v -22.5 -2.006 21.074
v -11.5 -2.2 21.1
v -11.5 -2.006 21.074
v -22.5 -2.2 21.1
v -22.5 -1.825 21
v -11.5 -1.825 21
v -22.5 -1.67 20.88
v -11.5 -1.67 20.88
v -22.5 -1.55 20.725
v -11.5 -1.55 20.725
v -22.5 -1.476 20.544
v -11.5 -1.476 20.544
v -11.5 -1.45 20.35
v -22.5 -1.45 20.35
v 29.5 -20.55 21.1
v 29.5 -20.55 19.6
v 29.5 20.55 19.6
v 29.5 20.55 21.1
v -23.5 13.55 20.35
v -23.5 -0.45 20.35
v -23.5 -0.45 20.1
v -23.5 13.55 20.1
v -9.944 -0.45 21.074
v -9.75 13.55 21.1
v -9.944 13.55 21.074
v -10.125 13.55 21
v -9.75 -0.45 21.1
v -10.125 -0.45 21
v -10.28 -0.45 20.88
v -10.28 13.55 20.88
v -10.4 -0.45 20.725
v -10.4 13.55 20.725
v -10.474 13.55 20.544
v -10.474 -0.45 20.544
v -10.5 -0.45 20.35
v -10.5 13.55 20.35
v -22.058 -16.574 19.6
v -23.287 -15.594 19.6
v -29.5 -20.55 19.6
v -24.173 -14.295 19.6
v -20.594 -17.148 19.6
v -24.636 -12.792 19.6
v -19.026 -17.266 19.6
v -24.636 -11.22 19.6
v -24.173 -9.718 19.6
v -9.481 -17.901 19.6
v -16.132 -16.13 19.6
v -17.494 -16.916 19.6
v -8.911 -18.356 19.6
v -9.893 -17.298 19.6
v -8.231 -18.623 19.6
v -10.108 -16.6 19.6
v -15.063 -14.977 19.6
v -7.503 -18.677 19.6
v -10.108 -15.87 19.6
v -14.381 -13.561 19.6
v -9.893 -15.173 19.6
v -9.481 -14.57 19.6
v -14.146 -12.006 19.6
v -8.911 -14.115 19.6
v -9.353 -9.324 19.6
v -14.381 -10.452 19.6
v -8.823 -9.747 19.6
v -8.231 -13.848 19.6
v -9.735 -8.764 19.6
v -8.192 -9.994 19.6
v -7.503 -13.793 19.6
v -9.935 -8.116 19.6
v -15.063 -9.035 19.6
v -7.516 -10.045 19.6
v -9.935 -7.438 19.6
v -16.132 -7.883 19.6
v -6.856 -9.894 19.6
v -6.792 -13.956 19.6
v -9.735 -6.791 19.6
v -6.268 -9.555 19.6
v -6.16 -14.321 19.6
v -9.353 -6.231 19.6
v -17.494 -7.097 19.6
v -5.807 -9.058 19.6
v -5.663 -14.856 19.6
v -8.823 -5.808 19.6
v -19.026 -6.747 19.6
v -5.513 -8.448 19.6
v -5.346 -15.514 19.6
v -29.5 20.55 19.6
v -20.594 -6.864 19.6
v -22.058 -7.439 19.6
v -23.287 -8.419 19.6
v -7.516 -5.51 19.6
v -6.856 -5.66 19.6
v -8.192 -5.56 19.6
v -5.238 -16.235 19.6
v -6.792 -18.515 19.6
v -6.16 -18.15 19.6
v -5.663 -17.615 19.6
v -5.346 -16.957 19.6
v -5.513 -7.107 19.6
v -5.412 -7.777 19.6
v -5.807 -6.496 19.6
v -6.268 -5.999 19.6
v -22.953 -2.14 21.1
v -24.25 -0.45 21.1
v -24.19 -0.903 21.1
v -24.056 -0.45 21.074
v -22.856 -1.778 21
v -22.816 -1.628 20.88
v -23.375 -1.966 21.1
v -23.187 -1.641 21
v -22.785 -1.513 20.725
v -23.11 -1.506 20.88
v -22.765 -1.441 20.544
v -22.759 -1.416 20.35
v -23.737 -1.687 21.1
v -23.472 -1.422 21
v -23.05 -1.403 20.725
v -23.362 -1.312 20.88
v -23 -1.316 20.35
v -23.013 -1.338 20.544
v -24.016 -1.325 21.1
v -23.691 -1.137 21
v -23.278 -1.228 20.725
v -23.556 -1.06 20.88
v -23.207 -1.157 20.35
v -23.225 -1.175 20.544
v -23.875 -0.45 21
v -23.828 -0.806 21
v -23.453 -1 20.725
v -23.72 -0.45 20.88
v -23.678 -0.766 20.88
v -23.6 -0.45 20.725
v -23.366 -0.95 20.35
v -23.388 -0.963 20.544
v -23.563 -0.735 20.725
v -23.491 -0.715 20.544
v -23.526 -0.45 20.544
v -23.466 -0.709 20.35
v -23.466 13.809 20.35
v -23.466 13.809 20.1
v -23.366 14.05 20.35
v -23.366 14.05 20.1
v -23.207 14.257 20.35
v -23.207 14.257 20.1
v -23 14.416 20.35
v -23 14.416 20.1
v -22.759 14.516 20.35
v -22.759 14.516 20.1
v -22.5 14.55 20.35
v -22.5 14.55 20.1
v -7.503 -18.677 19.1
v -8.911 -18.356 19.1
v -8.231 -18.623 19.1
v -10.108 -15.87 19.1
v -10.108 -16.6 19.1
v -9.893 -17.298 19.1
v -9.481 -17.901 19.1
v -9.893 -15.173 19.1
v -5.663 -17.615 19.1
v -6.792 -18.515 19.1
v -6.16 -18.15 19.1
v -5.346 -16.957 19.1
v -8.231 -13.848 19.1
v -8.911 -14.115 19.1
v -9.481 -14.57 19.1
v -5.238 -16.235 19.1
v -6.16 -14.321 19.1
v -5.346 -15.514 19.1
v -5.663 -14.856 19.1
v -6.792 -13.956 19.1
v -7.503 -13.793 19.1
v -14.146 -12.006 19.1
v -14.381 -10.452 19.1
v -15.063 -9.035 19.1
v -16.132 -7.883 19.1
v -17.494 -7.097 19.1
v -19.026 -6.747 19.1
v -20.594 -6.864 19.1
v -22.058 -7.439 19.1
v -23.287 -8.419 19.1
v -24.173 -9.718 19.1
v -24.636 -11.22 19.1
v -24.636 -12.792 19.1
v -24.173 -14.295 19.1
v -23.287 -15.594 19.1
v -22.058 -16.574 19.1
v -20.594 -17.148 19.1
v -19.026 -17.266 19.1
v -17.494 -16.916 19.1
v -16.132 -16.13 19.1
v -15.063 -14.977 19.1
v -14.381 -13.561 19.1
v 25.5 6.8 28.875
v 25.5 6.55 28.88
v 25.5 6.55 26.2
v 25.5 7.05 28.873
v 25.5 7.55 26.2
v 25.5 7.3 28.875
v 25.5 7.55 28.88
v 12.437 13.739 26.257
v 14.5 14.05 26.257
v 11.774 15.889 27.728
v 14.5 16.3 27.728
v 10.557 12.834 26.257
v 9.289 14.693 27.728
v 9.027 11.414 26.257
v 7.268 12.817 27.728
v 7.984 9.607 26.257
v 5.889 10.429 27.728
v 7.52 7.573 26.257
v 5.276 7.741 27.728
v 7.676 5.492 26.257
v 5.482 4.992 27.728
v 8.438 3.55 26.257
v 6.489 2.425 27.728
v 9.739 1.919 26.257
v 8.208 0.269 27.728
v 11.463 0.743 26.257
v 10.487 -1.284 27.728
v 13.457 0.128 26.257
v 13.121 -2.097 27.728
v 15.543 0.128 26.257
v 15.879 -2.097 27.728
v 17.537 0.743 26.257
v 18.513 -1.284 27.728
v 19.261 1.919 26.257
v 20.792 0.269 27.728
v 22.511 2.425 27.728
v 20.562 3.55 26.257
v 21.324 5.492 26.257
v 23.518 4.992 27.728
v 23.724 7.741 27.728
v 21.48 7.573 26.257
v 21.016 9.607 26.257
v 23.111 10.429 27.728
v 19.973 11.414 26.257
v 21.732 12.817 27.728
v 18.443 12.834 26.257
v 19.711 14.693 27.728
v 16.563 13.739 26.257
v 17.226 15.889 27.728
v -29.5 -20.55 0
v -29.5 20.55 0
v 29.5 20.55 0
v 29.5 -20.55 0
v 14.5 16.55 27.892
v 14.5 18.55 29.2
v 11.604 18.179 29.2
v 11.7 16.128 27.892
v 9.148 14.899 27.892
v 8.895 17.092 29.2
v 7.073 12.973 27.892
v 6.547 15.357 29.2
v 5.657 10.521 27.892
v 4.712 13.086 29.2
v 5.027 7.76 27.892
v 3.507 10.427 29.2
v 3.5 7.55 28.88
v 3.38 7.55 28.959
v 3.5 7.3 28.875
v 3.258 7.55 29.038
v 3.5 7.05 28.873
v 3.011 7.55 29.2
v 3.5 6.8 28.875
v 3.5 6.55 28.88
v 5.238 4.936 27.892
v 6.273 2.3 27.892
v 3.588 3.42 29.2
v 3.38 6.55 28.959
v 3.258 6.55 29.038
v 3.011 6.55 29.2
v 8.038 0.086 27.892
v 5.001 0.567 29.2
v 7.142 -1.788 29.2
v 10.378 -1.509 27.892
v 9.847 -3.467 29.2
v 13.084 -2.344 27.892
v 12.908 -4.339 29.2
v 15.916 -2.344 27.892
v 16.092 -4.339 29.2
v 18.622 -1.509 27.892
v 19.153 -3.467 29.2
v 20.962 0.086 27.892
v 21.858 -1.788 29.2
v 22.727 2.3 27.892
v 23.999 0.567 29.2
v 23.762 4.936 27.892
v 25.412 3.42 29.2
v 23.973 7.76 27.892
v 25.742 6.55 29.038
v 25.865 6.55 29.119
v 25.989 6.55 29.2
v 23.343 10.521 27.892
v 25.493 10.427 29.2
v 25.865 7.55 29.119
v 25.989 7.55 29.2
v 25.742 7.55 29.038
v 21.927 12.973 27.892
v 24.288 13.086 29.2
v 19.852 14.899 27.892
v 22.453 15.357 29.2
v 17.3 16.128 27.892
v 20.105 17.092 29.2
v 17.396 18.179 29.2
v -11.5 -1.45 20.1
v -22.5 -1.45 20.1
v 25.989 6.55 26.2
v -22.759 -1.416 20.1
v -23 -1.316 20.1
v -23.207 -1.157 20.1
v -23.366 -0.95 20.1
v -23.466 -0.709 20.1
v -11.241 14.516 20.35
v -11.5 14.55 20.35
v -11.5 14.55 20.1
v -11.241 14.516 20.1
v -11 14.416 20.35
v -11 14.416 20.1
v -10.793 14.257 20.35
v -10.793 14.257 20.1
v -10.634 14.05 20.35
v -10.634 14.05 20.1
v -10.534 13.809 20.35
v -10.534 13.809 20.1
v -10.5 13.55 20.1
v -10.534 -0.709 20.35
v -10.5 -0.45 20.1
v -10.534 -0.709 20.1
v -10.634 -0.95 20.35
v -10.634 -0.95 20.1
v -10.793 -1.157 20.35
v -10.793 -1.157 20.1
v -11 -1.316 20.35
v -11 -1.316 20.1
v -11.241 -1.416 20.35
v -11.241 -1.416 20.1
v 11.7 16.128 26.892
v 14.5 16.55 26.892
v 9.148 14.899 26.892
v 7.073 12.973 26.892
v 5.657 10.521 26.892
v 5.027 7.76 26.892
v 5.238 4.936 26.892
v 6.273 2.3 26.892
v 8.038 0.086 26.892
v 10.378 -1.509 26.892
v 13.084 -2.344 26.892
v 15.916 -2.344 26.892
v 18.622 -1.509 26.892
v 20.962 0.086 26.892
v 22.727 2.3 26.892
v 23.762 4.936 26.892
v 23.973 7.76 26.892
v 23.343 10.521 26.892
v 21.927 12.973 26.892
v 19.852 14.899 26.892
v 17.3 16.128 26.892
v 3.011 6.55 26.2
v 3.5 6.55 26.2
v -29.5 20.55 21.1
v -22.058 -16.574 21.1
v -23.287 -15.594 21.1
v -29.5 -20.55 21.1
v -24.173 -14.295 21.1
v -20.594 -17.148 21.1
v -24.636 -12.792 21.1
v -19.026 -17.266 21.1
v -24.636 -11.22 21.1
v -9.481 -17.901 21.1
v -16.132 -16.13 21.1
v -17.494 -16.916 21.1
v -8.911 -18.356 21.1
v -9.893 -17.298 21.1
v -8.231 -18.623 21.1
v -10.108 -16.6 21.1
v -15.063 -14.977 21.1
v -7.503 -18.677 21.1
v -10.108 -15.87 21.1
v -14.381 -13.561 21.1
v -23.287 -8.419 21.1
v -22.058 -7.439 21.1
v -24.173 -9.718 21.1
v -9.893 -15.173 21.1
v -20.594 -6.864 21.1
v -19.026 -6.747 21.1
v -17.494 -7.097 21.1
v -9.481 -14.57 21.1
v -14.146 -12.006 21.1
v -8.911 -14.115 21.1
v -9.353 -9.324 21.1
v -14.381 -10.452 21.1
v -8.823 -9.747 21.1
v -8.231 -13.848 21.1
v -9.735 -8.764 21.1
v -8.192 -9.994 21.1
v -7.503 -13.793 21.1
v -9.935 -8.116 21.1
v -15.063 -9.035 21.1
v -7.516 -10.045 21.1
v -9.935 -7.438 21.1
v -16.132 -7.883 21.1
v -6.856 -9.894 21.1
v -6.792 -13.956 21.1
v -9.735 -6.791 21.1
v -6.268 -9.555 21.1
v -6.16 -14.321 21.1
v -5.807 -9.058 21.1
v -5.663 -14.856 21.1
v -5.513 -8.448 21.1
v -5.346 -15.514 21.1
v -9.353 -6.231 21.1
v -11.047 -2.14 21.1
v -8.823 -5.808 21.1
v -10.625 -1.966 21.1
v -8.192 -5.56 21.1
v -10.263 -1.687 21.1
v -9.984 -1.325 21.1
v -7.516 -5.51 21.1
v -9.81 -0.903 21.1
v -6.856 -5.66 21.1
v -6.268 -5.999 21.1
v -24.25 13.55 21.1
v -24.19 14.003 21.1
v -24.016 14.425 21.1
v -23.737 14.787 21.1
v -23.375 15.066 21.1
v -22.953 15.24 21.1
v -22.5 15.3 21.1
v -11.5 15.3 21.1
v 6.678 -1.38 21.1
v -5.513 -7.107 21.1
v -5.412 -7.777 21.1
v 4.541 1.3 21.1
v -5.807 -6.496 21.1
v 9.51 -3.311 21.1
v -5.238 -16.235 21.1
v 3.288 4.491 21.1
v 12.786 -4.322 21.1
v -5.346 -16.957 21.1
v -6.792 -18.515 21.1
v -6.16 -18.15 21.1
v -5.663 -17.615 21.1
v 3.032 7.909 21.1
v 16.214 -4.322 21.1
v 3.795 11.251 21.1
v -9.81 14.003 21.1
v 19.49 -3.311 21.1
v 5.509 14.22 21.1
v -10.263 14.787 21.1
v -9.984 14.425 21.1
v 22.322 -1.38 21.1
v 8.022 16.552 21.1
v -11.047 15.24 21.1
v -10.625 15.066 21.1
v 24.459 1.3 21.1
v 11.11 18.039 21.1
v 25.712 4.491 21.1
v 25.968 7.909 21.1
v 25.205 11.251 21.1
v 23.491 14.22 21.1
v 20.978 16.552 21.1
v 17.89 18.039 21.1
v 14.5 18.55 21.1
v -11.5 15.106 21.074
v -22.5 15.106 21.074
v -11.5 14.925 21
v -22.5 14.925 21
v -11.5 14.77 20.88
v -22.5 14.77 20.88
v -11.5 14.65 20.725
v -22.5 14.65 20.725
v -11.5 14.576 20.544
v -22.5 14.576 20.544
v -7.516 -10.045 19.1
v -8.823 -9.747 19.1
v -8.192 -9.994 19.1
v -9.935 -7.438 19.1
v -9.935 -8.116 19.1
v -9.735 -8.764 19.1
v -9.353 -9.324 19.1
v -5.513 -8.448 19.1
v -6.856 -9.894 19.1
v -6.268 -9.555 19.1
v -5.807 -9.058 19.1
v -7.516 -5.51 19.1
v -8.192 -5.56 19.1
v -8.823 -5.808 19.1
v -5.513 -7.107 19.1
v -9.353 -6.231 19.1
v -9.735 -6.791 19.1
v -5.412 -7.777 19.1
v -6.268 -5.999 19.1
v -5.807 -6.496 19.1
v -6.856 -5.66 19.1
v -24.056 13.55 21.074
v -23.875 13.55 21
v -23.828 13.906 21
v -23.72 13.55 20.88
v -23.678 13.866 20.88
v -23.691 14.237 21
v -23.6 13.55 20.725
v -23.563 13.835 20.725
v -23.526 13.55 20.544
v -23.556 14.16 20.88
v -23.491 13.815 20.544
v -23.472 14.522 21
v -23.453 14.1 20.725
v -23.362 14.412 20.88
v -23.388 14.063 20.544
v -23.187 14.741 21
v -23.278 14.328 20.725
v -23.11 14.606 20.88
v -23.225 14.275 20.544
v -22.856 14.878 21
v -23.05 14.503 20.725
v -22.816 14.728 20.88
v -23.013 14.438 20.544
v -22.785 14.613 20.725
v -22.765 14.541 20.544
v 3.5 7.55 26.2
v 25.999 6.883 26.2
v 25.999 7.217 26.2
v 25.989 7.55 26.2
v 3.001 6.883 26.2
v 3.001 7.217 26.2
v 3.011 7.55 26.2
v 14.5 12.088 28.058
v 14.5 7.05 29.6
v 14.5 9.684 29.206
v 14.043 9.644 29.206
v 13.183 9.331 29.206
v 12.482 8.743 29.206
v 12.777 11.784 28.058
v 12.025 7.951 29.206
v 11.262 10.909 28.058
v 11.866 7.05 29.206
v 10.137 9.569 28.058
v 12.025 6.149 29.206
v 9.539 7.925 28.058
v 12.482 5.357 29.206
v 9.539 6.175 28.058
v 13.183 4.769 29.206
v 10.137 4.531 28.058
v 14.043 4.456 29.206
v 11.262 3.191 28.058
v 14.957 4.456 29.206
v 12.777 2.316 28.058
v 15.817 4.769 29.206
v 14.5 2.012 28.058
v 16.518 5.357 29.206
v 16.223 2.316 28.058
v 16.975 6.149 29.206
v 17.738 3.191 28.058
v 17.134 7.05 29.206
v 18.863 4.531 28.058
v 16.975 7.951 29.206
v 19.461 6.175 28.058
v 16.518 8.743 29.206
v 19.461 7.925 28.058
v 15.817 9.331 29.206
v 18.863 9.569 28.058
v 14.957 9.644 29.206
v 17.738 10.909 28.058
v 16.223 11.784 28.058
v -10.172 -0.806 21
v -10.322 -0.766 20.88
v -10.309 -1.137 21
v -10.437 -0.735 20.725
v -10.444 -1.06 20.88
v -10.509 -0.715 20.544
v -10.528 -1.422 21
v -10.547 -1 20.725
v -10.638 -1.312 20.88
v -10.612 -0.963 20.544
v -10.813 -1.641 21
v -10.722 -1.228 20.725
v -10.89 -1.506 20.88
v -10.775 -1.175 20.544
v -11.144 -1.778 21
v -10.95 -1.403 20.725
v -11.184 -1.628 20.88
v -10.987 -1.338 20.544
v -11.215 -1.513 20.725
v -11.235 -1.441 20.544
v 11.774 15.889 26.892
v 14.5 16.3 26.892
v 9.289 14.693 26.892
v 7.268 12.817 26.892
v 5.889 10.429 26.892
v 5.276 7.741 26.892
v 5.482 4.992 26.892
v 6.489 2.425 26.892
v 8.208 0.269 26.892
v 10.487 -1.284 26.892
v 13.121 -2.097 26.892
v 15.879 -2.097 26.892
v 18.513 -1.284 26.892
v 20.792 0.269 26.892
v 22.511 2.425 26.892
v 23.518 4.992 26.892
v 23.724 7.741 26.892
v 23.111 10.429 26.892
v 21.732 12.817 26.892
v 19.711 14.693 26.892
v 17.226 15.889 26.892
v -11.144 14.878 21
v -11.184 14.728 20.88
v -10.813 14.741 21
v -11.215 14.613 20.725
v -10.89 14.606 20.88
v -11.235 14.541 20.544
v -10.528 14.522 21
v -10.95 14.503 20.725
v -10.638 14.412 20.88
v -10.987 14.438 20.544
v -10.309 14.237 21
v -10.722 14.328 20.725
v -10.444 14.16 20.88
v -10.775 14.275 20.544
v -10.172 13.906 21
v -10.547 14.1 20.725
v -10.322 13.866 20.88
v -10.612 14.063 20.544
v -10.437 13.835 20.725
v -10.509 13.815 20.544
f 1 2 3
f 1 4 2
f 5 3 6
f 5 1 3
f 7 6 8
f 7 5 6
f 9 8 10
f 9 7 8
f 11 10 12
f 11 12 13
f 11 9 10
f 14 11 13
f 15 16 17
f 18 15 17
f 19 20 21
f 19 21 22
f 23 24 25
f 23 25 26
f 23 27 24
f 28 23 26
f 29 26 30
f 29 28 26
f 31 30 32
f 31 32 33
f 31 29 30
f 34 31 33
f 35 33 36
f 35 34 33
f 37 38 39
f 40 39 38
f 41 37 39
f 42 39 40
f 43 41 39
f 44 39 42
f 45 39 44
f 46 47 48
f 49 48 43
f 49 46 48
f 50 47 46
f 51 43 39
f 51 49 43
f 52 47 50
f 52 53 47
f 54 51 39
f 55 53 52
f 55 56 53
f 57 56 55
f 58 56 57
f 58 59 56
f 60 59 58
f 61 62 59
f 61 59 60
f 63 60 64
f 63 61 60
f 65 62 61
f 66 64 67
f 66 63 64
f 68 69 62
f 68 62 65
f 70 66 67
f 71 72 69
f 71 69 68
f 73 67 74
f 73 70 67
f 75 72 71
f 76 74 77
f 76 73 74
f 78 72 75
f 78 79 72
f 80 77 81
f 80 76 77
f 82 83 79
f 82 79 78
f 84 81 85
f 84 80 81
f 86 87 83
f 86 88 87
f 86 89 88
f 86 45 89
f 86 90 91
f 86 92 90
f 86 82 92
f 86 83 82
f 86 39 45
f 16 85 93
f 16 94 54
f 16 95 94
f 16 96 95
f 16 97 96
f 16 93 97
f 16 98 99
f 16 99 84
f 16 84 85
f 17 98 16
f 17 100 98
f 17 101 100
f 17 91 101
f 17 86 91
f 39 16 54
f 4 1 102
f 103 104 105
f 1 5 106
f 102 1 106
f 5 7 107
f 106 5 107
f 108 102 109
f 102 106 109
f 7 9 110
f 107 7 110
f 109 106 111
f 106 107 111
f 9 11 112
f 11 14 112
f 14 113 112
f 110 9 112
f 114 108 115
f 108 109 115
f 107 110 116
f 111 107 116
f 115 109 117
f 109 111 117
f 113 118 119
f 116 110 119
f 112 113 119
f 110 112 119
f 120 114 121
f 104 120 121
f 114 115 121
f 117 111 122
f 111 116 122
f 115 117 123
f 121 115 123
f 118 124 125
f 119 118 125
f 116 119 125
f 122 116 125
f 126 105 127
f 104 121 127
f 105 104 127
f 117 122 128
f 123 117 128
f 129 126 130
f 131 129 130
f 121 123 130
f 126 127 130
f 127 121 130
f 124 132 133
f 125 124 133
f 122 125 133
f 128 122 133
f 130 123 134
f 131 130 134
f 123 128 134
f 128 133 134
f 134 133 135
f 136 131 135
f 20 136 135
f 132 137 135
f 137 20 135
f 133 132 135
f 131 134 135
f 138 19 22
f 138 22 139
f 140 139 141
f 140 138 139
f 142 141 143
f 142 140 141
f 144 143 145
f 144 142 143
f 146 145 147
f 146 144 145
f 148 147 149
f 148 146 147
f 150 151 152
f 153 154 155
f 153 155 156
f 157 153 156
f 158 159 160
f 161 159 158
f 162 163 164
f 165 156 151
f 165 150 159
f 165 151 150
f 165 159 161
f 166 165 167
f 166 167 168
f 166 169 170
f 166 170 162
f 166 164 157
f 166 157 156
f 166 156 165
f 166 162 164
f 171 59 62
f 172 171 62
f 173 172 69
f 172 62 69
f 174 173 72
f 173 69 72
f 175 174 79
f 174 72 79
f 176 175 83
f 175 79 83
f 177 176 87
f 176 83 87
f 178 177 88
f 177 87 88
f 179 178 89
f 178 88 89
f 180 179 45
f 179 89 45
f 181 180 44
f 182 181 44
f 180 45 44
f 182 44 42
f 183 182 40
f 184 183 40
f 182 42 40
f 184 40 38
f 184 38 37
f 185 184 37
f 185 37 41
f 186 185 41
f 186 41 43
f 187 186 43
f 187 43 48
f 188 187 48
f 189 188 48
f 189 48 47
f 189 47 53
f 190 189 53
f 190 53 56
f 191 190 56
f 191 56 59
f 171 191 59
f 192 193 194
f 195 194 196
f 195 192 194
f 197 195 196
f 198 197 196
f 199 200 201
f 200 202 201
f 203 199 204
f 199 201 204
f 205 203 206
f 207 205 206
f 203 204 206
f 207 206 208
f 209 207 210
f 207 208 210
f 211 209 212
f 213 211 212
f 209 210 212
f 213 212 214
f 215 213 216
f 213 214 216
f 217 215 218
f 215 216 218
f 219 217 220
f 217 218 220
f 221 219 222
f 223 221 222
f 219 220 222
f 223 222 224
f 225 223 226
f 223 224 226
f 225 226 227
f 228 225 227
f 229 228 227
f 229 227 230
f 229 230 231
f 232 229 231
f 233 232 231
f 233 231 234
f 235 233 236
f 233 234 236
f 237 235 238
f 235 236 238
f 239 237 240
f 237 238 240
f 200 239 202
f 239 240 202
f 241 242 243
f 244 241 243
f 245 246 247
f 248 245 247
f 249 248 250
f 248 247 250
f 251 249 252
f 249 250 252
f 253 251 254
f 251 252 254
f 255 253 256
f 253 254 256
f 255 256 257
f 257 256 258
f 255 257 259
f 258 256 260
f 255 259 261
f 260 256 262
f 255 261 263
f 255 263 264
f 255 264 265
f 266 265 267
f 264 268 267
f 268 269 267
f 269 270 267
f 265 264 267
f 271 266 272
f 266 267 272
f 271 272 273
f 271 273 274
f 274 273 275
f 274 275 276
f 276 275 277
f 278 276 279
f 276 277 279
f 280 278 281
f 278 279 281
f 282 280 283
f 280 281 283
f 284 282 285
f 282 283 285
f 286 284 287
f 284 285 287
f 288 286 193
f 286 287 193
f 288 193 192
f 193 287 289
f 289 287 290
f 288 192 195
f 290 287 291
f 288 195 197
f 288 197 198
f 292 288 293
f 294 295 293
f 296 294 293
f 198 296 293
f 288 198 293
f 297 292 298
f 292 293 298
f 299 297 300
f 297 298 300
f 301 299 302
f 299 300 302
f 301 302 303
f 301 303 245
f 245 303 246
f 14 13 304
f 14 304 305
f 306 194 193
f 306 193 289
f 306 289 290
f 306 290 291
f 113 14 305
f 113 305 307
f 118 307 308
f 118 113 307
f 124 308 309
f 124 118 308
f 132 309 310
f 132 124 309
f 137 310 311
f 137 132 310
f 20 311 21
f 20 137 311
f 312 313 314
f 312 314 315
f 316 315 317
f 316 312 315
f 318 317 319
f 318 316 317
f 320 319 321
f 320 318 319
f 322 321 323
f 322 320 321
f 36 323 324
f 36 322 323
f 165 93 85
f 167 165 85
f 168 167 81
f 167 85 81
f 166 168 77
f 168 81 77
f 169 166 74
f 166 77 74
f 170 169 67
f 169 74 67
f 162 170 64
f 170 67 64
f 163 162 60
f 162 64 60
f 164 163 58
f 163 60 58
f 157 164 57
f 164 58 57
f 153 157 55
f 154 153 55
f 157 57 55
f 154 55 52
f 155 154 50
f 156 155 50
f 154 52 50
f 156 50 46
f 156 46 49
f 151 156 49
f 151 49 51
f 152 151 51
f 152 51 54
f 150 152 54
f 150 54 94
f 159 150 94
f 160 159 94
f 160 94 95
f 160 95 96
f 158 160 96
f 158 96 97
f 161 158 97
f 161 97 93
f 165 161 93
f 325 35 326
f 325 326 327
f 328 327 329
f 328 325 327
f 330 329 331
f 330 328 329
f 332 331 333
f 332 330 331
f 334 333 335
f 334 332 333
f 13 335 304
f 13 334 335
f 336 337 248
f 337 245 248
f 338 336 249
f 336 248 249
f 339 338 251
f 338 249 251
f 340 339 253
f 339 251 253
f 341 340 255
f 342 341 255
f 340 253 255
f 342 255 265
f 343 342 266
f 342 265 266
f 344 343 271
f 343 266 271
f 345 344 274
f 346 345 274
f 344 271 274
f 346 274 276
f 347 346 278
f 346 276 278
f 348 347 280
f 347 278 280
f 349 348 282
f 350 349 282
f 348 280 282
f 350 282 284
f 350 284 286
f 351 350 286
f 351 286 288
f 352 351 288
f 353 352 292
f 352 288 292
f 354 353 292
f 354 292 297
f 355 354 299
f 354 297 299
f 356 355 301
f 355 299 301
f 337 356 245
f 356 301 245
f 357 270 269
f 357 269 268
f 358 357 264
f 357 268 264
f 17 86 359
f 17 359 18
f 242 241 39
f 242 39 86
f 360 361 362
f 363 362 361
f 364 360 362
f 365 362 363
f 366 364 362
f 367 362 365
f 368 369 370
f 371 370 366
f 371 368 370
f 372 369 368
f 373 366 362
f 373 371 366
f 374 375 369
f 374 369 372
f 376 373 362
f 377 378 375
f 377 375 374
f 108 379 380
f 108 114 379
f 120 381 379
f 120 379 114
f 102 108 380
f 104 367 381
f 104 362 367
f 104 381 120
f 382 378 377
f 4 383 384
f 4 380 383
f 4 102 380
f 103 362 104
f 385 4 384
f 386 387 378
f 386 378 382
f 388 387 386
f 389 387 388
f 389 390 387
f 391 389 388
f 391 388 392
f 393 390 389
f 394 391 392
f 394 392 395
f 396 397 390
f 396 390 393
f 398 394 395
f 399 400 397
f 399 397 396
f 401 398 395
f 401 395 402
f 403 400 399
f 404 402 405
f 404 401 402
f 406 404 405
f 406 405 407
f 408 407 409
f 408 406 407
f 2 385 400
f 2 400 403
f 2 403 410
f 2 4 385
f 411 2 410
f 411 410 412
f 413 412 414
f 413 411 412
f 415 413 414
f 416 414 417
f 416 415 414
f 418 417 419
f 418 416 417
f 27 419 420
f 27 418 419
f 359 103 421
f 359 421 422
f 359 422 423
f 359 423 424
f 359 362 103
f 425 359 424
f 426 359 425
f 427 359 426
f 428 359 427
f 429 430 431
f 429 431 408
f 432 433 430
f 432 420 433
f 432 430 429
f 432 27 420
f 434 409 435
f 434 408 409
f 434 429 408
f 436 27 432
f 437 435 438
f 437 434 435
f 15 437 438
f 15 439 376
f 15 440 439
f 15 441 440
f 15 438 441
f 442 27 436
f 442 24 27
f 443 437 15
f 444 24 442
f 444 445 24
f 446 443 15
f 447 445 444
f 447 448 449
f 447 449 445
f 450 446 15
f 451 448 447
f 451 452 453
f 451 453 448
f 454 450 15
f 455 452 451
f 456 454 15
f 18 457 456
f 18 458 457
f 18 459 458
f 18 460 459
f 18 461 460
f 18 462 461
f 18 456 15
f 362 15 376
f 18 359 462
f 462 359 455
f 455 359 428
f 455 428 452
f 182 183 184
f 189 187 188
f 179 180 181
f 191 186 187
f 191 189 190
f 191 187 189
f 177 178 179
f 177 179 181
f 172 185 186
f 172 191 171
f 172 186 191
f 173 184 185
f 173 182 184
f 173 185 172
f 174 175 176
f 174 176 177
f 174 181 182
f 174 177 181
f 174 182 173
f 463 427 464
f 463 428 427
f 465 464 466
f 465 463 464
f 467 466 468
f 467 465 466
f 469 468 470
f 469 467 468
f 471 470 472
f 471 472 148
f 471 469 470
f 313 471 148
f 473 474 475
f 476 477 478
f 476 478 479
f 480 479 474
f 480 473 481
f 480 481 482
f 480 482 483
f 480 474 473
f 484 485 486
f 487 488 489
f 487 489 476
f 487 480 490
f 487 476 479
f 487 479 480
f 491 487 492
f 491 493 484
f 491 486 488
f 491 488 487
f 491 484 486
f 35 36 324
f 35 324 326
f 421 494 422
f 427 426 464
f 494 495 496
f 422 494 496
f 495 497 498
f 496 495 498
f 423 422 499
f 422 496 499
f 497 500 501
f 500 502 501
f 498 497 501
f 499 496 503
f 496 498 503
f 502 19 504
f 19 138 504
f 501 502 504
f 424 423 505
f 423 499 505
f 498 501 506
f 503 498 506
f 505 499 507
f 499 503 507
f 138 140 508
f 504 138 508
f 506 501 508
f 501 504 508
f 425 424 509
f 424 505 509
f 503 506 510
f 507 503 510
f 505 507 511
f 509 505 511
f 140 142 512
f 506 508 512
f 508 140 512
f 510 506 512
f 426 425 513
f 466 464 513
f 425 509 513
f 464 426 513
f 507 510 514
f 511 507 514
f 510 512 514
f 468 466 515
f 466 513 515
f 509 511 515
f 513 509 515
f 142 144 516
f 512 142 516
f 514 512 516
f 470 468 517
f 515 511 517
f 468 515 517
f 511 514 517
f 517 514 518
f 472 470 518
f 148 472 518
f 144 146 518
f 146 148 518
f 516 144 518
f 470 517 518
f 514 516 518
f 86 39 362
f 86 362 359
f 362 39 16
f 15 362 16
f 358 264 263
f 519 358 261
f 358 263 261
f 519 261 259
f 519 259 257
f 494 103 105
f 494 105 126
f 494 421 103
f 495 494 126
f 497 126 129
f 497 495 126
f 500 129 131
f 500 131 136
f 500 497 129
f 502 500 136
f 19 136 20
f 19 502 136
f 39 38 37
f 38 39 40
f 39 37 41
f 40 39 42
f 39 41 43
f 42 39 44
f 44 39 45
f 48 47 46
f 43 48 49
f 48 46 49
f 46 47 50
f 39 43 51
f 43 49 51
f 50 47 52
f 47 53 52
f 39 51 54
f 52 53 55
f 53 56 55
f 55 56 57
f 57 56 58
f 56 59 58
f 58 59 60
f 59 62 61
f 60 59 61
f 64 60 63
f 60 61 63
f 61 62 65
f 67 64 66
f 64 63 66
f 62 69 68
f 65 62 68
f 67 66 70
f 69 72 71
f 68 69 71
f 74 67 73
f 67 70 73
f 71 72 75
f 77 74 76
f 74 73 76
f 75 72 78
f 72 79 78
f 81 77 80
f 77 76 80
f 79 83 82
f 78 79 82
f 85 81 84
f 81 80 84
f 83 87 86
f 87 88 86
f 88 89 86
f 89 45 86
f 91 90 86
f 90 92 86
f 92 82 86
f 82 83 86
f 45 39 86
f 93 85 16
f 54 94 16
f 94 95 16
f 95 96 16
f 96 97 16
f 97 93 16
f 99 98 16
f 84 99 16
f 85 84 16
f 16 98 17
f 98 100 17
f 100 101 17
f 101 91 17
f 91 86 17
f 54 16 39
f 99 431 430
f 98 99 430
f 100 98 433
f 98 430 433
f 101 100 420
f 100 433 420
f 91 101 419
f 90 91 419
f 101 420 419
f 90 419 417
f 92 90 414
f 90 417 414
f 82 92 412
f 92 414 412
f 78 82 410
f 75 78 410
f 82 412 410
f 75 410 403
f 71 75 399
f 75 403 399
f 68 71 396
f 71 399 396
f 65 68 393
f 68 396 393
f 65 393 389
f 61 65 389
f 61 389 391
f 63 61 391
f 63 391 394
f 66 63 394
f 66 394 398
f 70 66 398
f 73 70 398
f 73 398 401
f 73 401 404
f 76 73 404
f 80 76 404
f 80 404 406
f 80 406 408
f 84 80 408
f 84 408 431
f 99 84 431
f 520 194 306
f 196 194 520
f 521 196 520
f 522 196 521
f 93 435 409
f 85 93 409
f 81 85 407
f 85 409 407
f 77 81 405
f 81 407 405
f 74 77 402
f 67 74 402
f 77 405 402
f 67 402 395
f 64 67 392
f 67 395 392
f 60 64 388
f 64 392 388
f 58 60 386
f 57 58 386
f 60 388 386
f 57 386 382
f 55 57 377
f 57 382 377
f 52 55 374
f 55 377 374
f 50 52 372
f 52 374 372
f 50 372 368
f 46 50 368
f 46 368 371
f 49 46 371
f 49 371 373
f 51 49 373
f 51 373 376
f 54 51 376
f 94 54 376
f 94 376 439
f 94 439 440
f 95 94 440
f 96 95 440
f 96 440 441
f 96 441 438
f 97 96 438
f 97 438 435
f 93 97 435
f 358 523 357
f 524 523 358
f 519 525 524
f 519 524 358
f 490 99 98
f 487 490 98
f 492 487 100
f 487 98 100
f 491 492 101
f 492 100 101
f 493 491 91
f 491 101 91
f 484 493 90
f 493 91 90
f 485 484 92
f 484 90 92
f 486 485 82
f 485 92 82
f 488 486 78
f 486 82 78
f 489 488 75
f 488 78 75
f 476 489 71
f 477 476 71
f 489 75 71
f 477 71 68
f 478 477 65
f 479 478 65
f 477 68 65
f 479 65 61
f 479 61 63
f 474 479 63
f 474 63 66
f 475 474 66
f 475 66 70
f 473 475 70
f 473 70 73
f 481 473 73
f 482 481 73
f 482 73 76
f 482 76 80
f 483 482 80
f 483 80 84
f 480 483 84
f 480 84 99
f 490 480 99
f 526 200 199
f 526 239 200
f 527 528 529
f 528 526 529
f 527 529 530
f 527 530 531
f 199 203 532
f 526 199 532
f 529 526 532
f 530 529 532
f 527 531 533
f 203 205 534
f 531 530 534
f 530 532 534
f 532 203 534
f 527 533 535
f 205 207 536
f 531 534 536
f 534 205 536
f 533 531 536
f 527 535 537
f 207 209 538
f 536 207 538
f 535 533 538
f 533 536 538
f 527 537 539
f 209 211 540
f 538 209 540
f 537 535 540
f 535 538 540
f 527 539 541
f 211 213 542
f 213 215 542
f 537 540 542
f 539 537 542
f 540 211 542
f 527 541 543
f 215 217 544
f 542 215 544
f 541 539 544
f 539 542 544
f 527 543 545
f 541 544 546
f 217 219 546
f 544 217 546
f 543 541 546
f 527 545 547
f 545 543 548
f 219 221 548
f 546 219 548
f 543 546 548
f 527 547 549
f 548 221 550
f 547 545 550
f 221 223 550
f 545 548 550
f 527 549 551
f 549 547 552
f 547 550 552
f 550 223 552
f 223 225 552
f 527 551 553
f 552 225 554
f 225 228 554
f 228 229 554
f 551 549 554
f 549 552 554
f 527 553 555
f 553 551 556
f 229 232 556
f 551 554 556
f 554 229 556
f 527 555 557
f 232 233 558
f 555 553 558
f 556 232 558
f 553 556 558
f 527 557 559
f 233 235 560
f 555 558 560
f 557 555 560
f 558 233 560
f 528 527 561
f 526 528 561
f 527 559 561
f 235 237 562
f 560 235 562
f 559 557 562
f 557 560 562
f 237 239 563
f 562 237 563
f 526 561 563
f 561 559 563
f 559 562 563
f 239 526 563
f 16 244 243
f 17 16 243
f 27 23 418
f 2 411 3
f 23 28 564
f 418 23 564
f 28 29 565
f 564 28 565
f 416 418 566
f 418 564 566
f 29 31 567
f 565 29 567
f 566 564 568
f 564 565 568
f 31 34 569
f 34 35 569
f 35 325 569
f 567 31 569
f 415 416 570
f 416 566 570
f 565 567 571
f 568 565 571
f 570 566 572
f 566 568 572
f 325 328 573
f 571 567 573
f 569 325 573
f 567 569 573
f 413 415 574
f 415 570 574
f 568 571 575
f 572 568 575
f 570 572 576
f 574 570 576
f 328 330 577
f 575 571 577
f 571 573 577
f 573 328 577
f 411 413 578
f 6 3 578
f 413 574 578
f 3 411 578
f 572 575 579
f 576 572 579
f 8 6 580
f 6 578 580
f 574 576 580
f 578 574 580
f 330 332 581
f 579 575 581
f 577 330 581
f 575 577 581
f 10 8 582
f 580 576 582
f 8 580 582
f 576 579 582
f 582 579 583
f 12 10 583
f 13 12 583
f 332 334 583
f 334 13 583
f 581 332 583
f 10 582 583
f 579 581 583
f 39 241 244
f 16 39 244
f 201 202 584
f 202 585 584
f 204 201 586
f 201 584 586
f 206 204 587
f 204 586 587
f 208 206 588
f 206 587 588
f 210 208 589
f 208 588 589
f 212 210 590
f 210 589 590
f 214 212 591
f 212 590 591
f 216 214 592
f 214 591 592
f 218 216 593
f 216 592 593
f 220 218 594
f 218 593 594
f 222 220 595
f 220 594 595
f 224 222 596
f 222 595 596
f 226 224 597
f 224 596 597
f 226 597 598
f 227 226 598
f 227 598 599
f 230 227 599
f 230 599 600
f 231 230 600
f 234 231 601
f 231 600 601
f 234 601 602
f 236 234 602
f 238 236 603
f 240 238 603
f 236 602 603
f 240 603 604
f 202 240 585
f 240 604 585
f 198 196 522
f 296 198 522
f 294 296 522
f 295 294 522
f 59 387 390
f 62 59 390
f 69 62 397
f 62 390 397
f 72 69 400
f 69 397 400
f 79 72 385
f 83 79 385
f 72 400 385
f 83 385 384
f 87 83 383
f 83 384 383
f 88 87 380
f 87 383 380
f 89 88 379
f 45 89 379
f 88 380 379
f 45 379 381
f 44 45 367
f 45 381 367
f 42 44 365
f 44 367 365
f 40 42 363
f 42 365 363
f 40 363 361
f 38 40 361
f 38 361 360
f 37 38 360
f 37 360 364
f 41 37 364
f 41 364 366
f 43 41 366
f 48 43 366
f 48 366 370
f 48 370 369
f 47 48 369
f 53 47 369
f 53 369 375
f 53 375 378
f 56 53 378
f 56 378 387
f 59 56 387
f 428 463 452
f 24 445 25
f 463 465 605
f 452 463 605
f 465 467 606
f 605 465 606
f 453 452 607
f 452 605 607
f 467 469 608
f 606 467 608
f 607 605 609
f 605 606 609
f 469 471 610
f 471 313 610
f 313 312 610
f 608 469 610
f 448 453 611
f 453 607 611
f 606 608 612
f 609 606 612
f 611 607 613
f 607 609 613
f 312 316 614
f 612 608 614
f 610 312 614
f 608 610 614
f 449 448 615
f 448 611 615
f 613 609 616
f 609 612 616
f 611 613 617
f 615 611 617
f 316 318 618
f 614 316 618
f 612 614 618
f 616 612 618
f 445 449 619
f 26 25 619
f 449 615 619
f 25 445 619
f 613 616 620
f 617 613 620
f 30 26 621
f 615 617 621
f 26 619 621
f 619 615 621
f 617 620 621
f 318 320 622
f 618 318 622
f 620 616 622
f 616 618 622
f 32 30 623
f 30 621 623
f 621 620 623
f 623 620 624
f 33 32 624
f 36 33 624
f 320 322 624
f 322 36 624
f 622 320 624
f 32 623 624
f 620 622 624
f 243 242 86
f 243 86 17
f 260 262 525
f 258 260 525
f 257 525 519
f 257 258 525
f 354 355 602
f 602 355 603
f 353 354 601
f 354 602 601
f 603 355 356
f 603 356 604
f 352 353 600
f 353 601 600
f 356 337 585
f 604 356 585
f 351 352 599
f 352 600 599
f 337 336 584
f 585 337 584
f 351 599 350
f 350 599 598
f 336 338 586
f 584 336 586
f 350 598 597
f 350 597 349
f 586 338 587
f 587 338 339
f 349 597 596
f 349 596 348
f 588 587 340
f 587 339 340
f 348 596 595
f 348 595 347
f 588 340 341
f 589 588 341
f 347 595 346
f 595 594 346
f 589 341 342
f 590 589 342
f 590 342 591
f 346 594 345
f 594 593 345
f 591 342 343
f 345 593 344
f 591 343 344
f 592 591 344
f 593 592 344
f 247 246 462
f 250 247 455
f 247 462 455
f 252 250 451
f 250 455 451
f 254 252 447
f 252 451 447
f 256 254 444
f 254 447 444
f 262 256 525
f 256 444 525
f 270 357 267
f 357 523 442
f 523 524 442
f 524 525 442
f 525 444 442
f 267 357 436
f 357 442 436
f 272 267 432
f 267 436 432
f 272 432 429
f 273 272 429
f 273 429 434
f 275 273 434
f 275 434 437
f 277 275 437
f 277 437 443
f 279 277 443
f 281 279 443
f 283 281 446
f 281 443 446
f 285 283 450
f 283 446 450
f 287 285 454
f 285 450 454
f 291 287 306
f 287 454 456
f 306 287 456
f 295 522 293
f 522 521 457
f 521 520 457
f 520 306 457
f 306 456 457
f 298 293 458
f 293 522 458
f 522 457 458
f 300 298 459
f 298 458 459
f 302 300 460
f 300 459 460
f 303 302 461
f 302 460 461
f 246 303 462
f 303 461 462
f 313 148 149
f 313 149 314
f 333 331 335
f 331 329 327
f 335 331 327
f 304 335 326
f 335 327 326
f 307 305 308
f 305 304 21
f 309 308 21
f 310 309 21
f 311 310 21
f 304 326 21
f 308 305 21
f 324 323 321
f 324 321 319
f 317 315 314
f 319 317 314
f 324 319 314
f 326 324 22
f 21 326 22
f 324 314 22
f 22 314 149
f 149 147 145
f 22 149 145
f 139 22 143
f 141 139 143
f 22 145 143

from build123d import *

# Parameters (mm, degrees)
SKETCH1_W              = 59
SKETCH1_H              = 41.1
BOSS_EXTRUDE1_DEPTH    = 19.6
SKETCH2_W              = 59
SKETCH2_H              = 41.1
BOSS_EXTRUDE2_DEPTH    = 1.5
LENS_START             = 8.1
SKETCH5_W              = 0.5
SKETCH5_H              = 1
LENS_SIDE_CUTS_DEPTH   = 3
SCREEN_CUT_DEPTH       = 1
FILLET1_R              = 0.75
SKETCH7_R              = 5.274271813
SKETCH7_R_2            = 2.274069125
SKETCH7_R_3            = 2.44866529
BUTTON_CUTS_FACE_DEPTH = 2


with BuildPart() as part:
    # Sketch1 → Boss-Extrude1 (new body)
    with BuildSketch(Plane.XY):
        Rectangle(SKETCH1_W, SKETCH1_H)
    extrude(amount=BOSS_EXTRUDE1_DEPTH)


with BuildPart() as body_2:
    # Sketch2 → Boss-Extrude2 (new body)
    with BuildSketch(Plane.XY.offset(19.6)):
        Rectangle(SKETCH2_W, SKETCH2_H)
    extrude(amount=BOSS_EXTRUDE2_DEPTH)

    # Sketch4 → lens (revolve)
    with BuildSketch(Plane(origin=(14.5, 0, 0), x_dir=(0, 0, -1), z_dir=(1, 0, 0))):
        with BuildLine():
            Line((-21.1, 7.05), (-29.6, 7.05))
            ThreePointArc((-29.6, 7.05), (-28.721320344, 10.928679656), (-26.256854249, 14.05))
            Line((-26.256854249, 14.05), (-27.728427125, 16.3))
            Line((-27.728427125, 16.3), (-26.891935222, 16.3))
            Line((-26.891935222, 16.3), (-26.891935222, 16.55))
            Line((-26.891935222, 16.55), (-27.891935222, 16.55))
            Line((-27.891935222, 16.55), (-29.2, 18.55))
            Line((-29.2, 18.55), (-21.1, 18.55))
            Line((-21.1, 18.55), (-21.1, 7.05))
        make_face()
    revolve(axis=Axis((14.5, 7.05, 21.1), (0, 0, 1)))

    # Sketch5 → lens side cuts (cut)
    with BuildSketch(Plane.XY.offset(21.1).offset(LENS_START)):
        with Locations((25.75, 7.05)):
            Rectangle(SKETCH5_W, SKETCH5_H)
        with Locations((3.25, 7.05)):
            Rectangle(SKETCH5_W, SKETCH5_H)
    extrude(amount=-LENS_SIDE_CUTS_DEPTH, mode=Mode.SUBTRACT)

    # Sketch6 → Screen cut (cut)
    with BuildSketch(Plane.XY.offset(21.1)):
        with BuildLine():
            Line((-22.5, 14.55), (-11.5, 14.55))
            ThreePointArc((-11.5, 14.55), (-10.792893219, 14.257106781), (-10.5, 13.55))
            Line((-10.5, 13.55), (-10.5, -0.45))
            ThreePointArc((-10.5, -0.45), (-10.792893219, -1.157106781), (-11.5, -1.45))
            Line((-11.5, -1.45), (-22.5, -1.45))
            ThreePointArc((-22.5, -1.45), (-23.207106781, -1.157106781), (-23.5, -0.45))
            Line((-23.5, -0.45), (-23.5, 13.55))
            ThreePointArc((-23.5, 13.55), (-23.207106781, 14.257106781), (-22.5, 14.55))
        make_face()
    extrude(amount=-SCREEN_CUT_DEPTH, mode=Mode.SUBTRACT)

    # Fillet1
    fillet1_edges = [body_2.edges().sort_by_distance(p)[0] for p in [
        (-23.207106781, -1.157106781, 21.1),
        (-17, -1.45, 21.1),
        (-10.792893219, -1.157106781, 21.1),
        (-10.5, 6.55, 21.1),
        (-10.792893219, 14.257106781, 21.1),
        (-17, 14.55, 21.1),
        (-23.207106781, 14.257106781, 21.1),
        (-23.5, 6.55, 21.1),
    ]]
    fillet(fillet1_edges, radius=FILLET1_R)


with BuildPart() as button_cuts_face_tool:
    # Sketch7 → Button cuts - Face (new body)
    with BuildSketch(Plane.XY.offset(21.1)):
        with Locations((-19.420550326, -12.006300701)):
            Circle(SKETCH7_R)
        with Locations((-7.686353642, -7.777316407)):
            Circle(SKETCH7_R_2)
        with Locations((-7.686353642, -16.235284994)):
            Circle(SKETCH7_R_3)
    extrude(amount=-BUTTON_CUTS_FACE_DEPTH)


with BuildPart() as part_1:
    add(part.part)

    # Button cuts - Face: cut by button_cuts_face_tool
    add(button_cuts_face_tool.part, mode=Mode.SUBTRACT)


with BuildPart() as body_2_1:
    add(body_2.part)

    # Button cuts - Face: cut by button_cuts_face_tool
    add(button_cuts_face_tool.part, mode=Mode.SUBTRACT)


solid = Compound([part_1.part, body_2_1.part])
